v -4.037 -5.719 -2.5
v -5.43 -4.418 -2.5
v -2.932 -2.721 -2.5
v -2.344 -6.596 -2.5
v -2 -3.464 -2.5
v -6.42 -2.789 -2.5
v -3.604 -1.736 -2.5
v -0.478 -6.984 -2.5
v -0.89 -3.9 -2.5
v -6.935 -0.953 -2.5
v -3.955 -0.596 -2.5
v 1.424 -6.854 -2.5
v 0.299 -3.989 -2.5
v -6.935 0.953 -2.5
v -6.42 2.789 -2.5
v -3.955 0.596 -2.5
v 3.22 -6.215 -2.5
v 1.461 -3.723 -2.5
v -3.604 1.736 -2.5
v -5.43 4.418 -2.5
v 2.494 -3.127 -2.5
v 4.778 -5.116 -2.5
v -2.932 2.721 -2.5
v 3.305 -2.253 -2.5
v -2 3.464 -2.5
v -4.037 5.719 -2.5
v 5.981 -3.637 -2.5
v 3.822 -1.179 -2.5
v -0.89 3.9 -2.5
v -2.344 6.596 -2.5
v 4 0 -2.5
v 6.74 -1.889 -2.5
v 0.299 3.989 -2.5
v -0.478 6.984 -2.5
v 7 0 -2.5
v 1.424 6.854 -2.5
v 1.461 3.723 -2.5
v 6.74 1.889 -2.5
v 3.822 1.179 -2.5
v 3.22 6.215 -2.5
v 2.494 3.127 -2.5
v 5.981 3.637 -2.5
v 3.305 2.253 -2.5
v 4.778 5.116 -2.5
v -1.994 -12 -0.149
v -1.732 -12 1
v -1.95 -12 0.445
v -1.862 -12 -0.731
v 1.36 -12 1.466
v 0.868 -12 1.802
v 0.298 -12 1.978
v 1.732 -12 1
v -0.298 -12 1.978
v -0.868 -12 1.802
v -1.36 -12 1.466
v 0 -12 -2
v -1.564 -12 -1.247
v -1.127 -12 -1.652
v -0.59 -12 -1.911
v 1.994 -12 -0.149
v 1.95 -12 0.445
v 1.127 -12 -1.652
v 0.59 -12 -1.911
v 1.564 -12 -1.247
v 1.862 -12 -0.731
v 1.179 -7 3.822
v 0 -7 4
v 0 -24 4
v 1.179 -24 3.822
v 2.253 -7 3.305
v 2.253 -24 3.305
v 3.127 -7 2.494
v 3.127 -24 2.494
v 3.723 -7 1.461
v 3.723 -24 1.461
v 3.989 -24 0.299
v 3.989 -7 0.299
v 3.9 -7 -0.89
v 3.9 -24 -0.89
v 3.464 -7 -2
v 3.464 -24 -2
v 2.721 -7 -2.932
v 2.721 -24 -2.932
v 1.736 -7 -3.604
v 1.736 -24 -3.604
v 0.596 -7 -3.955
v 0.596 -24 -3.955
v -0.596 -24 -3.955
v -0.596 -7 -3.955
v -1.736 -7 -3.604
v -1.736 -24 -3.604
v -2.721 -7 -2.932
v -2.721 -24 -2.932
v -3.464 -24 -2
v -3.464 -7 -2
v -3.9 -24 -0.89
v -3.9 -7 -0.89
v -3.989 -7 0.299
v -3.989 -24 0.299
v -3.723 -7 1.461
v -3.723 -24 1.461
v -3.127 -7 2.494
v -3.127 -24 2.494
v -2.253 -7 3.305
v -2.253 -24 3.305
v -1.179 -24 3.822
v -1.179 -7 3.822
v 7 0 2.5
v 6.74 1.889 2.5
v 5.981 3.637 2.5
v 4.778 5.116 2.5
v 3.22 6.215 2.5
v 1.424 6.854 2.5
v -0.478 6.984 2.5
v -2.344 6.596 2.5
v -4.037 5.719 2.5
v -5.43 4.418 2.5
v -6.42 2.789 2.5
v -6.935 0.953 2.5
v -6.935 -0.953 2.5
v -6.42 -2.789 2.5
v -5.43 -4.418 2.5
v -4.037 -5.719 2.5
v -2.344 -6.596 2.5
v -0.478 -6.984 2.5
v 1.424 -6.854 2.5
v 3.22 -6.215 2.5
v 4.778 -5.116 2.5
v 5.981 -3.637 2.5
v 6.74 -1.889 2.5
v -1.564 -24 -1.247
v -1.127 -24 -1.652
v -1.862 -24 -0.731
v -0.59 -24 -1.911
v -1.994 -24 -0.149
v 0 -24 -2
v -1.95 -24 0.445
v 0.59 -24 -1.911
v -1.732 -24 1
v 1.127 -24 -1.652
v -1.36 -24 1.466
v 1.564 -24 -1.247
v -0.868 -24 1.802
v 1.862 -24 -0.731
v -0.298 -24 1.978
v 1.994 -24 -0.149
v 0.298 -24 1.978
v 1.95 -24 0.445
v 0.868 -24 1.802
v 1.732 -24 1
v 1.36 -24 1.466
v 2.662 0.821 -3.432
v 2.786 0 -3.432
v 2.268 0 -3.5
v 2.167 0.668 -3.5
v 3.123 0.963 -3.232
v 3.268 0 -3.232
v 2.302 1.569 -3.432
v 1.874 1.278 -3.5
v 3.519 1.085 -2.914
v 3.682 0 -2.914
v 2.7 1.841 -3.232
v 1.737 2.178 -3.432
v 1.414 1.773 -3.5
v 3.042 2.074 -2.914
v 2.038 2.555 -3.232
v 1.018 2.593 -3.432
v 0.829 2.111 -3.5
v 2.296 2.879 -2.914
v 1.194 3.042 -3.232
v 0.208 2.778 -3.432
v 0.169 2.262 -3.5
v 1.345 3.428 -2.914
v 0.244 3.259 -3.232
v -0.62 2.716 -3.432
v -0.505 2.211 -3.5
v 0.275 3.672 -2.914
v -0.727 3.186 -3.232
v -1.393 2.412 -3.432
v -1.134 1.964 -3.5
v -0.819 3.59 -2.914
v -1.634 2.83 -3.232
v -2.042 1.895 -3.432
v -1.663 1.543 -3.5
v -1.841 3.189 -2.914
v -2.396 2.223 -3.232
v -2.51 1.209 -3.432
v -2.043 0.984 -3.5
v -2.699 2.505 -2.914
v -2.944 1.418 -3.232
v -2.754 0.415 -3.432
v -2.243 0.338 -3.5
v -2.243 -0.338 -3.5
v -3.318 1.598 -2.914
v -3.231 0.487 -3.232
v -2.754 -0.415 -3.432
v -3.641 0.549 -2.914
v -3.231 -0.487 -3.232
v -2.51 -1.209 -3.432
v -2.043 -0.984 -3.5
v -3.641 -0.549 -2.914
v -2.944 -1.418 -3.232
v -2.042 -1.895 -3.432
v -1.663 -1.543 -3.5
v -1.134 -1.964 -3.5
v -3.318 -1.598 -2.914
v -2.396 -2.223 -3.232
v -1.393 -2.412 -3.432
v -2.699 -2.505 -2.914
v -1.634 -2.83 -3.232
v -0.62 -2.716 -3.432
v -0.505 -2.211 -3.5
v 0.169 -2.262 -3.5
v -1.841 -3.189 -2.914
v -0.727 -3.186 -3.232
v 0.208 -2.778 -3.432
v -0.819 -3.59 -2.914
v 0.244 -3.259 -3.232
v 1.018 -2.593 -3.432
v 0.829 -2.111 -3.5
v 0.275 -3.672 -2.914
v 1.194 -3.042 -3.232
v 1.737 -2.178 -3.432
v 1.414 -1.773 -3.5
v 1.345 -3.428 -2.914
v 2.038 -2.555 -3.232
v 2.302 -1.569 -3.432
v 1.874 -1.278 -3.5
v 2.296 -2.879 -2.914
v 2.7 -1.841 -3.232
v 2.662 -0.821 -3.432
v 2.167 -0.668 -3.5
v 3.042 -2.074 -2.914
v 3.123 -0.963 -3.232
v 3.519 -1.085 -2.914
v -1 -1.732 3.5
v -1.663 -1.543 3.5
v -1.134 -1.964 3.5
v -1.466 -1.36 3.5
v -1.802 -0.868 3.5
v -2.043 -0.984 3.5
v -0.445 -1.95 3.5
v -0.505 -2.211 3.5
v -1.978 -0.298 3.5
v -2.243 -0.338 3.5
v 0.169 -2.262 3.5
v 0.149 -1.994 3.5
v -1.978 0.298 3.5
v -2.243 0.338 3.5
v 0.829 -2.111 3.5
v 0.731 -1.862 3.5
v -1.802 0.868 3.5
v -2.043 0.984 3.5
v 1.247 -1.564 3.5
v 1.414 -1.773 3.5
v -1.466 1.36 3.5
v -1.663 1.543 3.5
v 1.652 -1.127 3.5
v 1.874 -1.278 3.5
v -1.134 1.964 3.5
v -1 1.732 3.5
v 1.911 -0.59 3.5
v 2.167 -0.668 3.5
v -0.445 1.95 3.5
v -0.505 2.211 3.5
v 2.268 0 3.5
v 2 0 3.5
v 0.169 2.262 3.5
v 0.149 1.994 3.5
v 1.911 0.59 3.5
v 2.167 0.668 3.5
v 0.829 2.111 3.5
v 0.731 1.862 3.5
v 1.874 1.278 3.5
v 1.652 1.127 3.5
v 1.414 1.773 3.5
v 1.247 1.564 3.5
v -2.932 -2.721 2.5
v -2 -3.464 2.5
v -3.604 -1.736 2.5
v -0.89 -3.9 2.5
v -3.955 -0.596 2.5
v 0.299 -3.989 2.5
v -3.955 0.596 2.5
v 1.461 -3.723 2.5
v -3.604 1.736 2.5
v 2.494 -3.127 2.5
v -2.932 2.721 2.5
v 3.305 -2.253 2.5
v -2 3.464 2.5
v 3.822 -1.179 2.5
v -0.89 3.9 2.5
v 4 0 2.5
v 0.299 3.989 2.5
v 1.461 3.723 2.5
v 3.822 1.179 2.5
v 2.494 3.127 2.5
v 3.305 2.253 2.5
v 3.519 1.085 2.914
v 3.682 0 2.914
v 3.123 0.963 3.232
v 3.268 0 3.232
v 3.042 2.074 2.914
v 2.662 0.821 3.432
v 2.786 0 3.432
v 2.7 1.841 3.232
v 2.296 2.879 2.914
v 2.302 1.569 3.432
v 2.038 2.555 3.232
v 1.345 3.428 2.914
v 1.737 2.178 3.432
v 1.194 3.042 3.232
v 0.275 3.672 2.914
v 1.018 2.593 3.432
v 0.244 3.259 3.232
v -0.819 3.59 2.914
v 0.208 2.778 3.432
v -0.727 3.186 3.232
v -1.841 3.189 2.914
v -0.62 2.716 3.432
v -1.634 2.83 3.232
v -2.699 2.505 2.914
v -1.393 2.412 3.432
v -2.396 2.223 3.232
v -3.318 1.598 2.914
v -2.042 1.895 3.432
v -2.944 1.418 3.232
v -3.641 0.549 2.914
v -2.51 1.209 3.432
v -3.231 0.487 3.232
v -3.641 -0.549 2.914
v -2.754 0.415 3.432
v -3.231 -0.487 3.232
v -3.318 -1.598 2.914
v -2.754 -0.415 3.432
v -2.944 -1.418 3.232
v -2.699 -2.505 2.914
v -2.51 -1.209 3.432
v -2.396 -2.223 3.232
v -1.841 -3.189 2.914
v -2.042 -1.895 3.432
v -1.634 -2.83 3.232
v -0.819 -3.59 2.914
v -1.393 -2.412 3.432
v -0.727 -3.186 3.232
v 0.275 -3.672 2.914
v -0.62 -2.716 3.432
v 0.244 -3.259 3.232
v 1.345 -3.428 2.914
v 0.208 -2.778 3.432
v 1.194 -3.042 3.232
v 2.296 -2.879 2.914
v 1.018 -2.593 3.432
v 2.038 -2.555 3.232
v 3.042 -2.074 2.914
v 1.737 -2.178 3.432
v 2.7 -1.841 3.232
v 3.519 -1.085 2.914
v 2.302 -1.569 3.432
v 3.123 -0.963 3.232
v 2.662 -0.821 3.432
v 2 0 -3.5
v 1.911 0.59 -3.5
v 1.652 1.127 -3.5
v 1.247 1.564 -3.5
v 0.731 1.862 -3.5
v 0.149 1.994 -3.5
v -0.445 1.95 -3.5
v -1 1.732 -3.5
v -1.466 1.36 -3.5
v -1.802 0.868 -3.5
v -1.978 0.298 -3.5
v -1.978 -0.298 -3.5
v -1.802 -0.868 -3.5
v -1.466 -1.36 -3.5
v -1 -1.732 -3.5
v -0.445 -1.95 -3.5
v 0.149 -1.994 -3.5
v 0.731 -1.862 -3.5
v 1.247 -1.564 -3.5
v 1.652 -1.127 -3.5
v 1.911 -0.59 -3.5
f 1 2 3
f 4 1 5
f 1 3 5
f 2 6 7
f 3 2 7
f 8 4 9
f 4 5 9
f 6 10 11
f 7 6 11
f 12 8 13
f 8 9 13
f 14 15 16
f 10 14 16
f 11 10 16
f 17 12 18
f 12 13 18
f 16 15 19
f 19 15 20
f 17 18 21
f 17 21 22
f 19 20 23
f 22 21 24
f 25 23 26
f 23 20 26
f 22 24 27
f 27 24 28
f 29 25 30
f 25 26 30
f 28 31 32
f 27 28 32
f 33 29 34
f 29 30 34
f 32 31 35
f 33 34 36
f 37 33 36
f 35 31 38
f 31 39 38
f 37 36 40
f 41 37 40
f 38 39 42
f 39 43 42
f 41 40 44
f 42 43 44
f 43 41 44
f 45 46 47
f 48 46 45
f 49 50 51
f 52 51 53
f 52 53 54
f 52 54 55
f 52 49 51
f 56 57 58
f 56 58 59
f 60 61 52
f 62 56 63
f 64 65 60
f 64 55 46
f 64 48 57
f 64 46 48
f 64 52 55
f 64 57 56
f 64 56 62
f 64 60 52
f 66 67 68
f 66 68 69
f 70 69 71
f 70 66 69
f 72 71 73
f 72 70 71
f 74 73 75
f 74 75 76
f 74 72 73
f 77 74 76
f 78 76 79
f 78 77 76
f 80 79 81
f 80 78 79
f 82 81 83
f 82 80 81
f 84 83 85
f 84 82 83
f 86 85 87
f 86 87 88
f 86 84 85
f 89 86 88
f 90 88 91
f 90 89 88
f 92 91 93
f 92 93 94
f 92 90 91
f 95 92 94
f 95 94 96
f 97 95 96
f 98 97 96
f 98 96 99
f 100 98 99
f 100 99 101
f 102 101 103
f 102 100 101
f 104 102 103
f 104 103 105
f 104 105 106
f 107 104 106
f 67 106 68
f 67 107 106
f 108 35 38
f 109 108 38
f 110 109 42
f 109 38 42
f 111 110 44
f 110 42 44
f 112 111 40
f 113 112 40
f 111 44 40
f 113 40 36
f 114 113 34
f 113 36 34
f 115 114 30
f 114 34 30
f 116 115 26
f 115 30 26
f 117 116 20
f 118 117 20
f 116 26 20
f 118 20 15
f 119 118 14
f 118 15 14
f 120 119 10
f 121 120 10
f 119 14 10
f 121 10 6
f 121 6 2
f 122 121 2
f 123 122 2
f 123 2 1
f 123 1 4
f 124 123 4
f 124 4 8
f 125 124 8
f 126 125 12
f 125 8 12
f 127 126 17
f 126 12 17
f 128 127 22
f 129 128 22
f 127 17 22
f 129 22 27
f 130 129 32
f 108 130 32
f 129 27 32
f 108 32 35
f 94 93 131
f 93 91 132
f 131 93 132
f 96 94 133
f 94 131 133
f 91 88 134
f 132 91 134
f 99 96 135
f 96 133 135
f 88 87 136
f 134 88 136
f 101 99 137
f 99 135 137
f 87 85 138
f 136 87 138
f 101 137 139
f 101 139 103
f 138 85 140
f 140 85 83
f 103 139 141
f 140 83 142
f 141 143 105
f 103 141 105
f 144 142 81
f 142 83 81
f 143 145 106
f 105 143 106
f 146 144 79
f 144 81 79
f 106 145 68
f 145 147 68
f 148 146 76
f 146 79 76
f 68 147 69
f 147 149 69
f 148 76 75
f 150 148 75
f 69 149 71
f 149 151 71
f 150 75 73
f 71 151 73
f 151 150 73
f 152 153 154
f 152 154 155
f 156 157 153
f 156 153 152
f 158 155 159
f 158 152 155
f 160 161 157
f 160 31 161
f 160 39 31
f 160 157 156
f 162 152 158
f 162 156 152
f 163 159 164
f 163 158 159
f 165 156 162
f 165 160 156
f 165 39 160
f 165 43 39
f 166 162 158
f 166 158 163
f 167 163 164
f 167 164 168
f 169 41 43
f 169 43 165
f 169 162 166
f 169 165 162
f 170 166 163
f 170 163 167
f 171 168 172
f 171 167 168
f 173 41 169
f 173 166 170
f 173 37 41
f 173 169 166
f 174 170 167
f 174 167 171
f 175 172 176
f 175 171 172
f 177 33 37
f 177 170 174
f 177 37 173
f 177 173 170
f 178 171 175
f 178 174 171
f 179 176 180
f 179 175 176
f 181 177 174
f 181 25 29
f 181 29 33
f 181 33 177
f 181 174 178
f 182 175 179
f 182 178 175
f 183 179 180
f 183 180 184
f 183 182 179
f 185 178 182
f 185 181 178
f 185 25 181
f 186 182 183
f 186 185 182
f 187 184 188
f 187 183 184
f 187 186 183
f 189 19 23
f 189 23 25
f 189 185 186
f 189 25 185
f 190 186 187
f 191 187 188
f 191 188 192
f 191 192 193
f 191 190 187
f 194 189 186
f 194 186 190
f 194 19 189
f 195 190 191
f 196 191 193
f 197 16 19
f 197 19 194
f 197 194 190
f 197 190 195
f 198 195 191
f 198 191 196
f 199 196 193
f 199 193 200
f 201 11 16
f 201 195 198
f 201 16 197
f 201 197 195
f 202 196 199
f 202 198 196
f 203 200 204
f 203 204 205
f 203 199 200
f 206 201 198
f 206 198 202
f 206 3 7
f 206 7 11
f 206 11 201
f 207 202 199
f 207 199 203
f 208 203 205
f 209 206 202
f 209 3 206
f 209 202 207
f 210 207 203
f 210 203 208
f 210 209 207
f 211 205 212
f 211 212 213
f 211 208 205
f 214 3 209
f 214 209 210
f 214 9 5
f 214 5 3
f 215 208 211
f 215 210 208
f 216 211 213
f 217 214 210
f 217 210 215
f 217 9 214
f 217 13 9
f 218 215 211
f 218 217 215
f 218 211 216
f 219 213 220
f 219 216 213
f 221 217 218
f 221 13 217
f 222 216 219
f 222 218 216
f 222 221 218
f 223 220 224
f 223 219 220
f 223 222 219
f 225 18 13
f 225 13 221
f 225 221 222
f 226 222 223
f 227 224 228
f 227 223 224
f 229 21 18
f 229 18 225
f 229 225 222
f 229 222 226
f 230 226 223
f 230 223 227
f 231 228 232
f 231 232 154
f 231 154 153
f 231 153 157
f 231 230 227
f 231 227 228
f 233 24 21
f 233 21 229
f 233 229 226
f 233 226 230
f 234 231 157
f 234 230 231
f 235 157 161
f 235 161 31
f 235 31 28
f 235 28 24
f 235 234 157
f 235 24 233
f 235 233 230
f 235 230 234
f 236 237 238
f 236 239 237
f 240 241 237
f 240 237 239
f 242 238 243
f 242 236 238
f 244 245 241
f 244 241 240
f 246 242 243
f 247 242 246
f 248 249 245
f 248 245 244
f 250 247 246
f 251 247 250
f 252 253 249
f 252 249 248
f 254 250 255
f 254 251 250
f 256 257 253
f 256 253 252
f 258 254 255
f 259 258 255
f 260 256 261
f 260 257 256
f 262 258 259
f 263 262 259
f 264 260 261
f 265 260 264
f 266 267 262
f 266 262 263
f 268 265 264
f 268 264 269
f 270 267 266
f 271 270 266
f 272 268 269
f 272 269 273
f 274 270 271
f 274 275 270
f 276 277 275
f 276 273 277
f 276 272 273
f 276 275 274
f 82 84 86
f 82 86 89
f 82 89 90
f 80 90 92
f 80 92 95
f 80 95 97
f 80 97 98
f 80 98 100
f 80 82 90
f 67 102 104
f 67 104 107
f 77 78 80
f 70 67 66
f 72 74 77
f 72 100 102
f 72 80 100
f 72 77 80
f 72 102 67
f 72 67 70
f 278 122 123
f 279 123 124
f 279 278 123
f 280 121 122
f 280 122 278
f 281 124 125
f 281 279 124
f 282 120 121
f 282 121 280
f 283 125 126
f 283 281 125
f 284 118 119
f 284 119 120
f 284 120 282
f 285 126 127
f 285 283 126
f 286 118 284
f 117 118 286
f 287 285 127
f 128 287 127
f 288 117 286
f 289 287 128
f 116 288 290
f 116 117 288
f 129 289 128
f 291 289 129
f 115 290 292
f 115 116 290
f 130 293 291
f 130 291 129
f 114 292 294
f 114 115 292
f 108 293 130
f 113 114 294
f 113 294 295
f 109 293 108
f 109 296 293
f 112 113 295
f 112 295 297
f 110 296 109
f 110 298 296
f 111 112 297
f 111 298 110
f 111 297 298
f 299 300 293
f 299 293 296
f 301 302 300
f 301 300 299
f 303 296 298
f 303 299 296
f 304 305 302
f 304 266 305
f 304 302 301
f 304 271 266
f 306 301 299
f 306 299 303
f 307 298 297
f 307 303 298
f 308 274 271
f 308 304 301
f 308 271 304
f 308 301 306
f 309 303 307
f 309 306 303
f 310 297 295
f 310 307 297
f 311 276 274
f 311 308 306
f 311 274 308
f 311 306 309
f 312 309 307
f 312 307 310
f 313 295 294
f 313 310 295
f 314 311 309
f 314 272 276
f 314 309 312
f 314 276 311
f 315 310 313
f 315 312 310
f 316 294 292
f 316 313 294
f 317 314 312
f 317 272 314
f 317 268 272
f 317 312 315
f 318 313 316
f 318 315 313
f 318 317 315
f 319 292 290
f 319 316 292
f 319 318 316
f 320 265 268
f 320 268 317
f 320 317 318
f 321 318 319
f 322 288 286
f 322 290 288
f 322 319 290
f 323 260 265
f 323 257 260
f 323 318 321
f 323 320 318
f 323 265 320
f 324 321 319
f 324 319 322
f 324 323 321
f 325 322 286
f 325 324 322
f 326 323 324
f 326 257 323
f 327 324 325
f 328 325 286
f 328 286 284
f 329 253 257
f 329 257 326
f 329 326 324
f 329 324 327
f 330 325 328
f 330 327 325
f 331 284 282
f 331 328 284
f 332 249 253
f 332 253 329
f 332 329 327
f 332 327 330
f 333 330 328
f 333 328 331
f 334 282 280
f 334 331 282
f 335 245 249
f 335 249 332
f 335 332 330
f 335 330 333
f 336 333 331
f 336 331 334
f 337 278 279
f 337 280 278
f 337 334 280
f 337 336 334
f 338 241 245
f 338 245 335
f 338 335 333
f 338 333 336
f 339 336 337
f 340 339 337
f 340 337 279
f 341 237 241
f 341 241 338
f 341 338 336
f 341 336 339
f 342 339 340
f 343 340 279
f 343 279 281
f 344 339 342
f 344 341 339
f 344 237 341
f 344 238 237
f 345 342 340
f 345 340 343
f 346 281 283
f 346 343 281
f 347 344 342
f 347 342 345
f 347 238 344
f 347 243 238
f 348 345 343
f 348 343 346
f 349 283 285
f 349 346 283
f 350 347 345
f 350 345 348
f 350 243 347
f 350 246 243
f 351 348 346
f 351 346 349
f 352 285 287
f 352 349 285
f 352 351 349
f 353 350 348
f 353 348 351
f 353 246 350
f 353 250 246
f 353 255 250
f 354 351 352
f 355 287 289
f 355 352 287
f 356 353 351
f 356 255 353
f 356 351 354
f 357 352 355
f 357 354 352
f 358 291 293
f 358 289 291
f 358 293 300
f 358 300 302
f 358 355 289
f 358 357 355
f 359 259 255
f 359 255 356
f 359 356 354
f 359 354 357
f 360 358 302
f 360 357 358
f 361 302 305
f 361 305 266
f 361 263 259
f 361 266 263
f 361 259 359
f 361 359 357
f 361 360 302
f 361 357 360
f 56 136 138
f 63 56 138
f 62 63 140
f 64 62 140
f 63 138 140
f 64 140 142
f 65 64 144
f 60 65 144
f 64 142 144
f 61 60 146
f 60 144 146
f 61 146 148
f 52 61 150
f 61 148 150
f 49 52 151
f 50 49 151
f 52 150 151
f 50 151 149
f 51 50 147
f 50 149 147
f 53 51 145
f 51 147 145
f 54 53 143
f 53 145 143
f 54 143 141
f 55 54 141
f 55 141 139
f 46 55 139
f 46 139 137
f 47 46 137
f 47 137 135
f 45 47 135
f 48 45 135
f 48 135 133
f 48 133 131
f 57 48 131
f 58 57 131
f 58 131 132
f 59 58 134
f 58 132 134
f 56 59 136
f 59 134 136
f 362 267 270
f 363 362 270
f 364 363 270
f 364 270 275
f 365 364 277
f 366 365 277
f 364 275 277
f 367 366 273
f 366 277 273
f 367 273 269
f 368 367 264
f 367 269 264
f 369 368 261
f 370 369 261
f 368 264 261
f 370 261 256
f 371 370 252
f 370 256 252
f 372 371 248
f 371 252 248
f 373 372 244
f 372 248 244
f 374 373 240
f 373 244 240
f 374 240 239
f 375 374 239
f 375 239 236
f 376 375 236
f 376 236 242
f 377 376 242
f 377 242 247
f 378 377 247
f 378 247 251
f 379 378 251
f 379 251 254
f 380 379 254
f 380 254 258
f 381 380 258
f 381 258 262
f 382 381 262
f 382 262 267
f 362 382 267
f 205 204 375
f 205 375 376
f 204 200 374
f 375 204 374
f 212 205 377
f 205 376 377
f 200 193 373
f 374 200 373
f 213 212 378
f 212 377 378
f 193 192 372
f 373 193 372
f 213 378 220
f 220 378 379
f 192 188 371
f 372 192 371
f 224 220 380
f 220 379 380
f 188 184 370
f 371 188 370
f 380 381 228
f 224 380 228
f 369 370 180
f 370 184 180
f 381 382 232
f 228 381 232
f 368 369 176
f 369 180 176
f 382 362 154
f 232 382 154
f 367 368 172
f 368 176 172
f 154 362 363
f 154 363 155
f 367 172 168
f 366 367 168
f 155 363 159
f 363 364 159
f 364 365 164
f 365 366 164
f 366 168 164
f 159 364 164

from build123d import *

# Parameters (mm, degrees)
EXTRUDE_1_DEPTH      = 2.5
EXTRUDE_1_DEPTH_BACK = 2.5
SKETCH_1_R           = 7
SKETCH_4_R           = 4
EXTRUDE_2_DEPTH      = 17
SKETCH_5_R           = 2
CUT_EXTRUDE_1_DEPTH  = 12
EXTRUDE_3_DEPTH      = 3.5
EXTRUDE_3_DEPTH_BACK = 3.5
SKETCH_7_R           = 4
SKETCH_8_R           = 2
CUT_EXTRUDE_2_DEPTH  = 27.100766272
FILLET_2_R           = 2


with BuildPart() as part:
    # Эскиз1 → Бобышка-Вытянуть1 (new, two sides: drawn at the far end of the back side and taken through both)
    with BuildSketch(Plane.XY.offset(-EXTRUDE_1_DEPTH_BACK)):
        Circle(SKETCH_1_R)
    extrude(amount=EXTRUDE_1_DEPTH + EXTRUDE_1_DEPTH_BACK)

    # Эскиз7 → Бобышка-Вытянуть3 (add, two sides: drawn at the far end of the back side and taken through both)
    with BuildSketch(Plane.XY.offset(-EXTRUDE_3_DEPTH_BACK)):
        Circle(SKETCH_7_R)
    extrude(amount=EXTRUDE_3_DEPTH + EXTRUDE_3_DEPTH_BACK)

    # Эскиз8 → Вырез-Вытянуть2 (cut, through all)
    with BuildSketch(Plane.XY.offset(3.5)):
        Circle(SKETCH_8_R)
    extrude(amount=-CUT_EXTRUDE_2_DEPTH, mode=Mode.SUBTRACT)

    # Скругление2
    # the kernel refuses this fillet: 2 mm, written as the material it takes off along each edge
    with BuildSketch(Plane(origin=(0, 0, -3.5), x_dir=(1, 0, 0), z_dir=(0, -1, 0))) as fillet_2_piece_1:
        with BuildLine():
            CenterArc((2.267949192, 2), FILLET_2_R, 270, 60)
            Line((2.267949192, 0), (2.267949192, -0.04))
            Line((2.267949192, -0.04), (4, -0.04))
            Line((4, -0.04), (4.04, 0))
            ThreePointArc((4.04, 0), (4.04, 0.5), (4.034641016, 0.98))
            Line((4.034641016, 0.98), (4, 1))
        make_face()
    revolve(axis=Axis((0, 0, -3.5), (0, 0, 1)), mode=Mode.SUBTRACT)
    with BuildSketch(Plane(origin=(0, 0, 3.5), x_dir=(1, 0, 0), z_dir=(0, -1, 0))) as fillet_2_piece_2:
        with BuildLine():
            CenterArc((2.267949192, -2), FILLET_2_R, 30, 60)
            Line((2.267949192, 0), (2.267949192, 0.04))
            Line((2.267949192, 0.04), (4, 0.04))
            Line((4, 0.04), (4.04, 0))
            ThreePointArc((4.04, 0), (4.04, -0.5), (4.034641016, -0.98))
            Line((4.034641016, -0.98), (4, -1))
        make_face()
    revolve(axis=Axis((0, 0, 3.5), (0, 0, 1)), mode=Mode.SUBTRACT)


with BuildPart() as body_2:
    # Эскиз4 → Бобышка-Вытянуть2 (new body)
    with BuildSketch(Plane(origin=(0, -7, 0), x_dir=(1, 0, 0), z_dir=(0, 1, 0))):
        with Locations(Location((0, 0, 0), (0, 0, 270))):
            Circle(SKETCH_4_R)
    extrude(amount=-EXTRUDE_2_DEPTH)

    # Эскиз5 → Вырез-Вытянуть1 (cut)
    with BuildSketch(Plane.XZ.offset(24)):
        with Locations(Location((0, 0, 0), (0, 0, 270))):
            Circle(SKETCH_5_R)
    extrude(amount=-CUT_EXTRUDE_1_DEPTH, mode=Mode.SUBTRACT)


solid = Compound([part.part, body_2.part])
